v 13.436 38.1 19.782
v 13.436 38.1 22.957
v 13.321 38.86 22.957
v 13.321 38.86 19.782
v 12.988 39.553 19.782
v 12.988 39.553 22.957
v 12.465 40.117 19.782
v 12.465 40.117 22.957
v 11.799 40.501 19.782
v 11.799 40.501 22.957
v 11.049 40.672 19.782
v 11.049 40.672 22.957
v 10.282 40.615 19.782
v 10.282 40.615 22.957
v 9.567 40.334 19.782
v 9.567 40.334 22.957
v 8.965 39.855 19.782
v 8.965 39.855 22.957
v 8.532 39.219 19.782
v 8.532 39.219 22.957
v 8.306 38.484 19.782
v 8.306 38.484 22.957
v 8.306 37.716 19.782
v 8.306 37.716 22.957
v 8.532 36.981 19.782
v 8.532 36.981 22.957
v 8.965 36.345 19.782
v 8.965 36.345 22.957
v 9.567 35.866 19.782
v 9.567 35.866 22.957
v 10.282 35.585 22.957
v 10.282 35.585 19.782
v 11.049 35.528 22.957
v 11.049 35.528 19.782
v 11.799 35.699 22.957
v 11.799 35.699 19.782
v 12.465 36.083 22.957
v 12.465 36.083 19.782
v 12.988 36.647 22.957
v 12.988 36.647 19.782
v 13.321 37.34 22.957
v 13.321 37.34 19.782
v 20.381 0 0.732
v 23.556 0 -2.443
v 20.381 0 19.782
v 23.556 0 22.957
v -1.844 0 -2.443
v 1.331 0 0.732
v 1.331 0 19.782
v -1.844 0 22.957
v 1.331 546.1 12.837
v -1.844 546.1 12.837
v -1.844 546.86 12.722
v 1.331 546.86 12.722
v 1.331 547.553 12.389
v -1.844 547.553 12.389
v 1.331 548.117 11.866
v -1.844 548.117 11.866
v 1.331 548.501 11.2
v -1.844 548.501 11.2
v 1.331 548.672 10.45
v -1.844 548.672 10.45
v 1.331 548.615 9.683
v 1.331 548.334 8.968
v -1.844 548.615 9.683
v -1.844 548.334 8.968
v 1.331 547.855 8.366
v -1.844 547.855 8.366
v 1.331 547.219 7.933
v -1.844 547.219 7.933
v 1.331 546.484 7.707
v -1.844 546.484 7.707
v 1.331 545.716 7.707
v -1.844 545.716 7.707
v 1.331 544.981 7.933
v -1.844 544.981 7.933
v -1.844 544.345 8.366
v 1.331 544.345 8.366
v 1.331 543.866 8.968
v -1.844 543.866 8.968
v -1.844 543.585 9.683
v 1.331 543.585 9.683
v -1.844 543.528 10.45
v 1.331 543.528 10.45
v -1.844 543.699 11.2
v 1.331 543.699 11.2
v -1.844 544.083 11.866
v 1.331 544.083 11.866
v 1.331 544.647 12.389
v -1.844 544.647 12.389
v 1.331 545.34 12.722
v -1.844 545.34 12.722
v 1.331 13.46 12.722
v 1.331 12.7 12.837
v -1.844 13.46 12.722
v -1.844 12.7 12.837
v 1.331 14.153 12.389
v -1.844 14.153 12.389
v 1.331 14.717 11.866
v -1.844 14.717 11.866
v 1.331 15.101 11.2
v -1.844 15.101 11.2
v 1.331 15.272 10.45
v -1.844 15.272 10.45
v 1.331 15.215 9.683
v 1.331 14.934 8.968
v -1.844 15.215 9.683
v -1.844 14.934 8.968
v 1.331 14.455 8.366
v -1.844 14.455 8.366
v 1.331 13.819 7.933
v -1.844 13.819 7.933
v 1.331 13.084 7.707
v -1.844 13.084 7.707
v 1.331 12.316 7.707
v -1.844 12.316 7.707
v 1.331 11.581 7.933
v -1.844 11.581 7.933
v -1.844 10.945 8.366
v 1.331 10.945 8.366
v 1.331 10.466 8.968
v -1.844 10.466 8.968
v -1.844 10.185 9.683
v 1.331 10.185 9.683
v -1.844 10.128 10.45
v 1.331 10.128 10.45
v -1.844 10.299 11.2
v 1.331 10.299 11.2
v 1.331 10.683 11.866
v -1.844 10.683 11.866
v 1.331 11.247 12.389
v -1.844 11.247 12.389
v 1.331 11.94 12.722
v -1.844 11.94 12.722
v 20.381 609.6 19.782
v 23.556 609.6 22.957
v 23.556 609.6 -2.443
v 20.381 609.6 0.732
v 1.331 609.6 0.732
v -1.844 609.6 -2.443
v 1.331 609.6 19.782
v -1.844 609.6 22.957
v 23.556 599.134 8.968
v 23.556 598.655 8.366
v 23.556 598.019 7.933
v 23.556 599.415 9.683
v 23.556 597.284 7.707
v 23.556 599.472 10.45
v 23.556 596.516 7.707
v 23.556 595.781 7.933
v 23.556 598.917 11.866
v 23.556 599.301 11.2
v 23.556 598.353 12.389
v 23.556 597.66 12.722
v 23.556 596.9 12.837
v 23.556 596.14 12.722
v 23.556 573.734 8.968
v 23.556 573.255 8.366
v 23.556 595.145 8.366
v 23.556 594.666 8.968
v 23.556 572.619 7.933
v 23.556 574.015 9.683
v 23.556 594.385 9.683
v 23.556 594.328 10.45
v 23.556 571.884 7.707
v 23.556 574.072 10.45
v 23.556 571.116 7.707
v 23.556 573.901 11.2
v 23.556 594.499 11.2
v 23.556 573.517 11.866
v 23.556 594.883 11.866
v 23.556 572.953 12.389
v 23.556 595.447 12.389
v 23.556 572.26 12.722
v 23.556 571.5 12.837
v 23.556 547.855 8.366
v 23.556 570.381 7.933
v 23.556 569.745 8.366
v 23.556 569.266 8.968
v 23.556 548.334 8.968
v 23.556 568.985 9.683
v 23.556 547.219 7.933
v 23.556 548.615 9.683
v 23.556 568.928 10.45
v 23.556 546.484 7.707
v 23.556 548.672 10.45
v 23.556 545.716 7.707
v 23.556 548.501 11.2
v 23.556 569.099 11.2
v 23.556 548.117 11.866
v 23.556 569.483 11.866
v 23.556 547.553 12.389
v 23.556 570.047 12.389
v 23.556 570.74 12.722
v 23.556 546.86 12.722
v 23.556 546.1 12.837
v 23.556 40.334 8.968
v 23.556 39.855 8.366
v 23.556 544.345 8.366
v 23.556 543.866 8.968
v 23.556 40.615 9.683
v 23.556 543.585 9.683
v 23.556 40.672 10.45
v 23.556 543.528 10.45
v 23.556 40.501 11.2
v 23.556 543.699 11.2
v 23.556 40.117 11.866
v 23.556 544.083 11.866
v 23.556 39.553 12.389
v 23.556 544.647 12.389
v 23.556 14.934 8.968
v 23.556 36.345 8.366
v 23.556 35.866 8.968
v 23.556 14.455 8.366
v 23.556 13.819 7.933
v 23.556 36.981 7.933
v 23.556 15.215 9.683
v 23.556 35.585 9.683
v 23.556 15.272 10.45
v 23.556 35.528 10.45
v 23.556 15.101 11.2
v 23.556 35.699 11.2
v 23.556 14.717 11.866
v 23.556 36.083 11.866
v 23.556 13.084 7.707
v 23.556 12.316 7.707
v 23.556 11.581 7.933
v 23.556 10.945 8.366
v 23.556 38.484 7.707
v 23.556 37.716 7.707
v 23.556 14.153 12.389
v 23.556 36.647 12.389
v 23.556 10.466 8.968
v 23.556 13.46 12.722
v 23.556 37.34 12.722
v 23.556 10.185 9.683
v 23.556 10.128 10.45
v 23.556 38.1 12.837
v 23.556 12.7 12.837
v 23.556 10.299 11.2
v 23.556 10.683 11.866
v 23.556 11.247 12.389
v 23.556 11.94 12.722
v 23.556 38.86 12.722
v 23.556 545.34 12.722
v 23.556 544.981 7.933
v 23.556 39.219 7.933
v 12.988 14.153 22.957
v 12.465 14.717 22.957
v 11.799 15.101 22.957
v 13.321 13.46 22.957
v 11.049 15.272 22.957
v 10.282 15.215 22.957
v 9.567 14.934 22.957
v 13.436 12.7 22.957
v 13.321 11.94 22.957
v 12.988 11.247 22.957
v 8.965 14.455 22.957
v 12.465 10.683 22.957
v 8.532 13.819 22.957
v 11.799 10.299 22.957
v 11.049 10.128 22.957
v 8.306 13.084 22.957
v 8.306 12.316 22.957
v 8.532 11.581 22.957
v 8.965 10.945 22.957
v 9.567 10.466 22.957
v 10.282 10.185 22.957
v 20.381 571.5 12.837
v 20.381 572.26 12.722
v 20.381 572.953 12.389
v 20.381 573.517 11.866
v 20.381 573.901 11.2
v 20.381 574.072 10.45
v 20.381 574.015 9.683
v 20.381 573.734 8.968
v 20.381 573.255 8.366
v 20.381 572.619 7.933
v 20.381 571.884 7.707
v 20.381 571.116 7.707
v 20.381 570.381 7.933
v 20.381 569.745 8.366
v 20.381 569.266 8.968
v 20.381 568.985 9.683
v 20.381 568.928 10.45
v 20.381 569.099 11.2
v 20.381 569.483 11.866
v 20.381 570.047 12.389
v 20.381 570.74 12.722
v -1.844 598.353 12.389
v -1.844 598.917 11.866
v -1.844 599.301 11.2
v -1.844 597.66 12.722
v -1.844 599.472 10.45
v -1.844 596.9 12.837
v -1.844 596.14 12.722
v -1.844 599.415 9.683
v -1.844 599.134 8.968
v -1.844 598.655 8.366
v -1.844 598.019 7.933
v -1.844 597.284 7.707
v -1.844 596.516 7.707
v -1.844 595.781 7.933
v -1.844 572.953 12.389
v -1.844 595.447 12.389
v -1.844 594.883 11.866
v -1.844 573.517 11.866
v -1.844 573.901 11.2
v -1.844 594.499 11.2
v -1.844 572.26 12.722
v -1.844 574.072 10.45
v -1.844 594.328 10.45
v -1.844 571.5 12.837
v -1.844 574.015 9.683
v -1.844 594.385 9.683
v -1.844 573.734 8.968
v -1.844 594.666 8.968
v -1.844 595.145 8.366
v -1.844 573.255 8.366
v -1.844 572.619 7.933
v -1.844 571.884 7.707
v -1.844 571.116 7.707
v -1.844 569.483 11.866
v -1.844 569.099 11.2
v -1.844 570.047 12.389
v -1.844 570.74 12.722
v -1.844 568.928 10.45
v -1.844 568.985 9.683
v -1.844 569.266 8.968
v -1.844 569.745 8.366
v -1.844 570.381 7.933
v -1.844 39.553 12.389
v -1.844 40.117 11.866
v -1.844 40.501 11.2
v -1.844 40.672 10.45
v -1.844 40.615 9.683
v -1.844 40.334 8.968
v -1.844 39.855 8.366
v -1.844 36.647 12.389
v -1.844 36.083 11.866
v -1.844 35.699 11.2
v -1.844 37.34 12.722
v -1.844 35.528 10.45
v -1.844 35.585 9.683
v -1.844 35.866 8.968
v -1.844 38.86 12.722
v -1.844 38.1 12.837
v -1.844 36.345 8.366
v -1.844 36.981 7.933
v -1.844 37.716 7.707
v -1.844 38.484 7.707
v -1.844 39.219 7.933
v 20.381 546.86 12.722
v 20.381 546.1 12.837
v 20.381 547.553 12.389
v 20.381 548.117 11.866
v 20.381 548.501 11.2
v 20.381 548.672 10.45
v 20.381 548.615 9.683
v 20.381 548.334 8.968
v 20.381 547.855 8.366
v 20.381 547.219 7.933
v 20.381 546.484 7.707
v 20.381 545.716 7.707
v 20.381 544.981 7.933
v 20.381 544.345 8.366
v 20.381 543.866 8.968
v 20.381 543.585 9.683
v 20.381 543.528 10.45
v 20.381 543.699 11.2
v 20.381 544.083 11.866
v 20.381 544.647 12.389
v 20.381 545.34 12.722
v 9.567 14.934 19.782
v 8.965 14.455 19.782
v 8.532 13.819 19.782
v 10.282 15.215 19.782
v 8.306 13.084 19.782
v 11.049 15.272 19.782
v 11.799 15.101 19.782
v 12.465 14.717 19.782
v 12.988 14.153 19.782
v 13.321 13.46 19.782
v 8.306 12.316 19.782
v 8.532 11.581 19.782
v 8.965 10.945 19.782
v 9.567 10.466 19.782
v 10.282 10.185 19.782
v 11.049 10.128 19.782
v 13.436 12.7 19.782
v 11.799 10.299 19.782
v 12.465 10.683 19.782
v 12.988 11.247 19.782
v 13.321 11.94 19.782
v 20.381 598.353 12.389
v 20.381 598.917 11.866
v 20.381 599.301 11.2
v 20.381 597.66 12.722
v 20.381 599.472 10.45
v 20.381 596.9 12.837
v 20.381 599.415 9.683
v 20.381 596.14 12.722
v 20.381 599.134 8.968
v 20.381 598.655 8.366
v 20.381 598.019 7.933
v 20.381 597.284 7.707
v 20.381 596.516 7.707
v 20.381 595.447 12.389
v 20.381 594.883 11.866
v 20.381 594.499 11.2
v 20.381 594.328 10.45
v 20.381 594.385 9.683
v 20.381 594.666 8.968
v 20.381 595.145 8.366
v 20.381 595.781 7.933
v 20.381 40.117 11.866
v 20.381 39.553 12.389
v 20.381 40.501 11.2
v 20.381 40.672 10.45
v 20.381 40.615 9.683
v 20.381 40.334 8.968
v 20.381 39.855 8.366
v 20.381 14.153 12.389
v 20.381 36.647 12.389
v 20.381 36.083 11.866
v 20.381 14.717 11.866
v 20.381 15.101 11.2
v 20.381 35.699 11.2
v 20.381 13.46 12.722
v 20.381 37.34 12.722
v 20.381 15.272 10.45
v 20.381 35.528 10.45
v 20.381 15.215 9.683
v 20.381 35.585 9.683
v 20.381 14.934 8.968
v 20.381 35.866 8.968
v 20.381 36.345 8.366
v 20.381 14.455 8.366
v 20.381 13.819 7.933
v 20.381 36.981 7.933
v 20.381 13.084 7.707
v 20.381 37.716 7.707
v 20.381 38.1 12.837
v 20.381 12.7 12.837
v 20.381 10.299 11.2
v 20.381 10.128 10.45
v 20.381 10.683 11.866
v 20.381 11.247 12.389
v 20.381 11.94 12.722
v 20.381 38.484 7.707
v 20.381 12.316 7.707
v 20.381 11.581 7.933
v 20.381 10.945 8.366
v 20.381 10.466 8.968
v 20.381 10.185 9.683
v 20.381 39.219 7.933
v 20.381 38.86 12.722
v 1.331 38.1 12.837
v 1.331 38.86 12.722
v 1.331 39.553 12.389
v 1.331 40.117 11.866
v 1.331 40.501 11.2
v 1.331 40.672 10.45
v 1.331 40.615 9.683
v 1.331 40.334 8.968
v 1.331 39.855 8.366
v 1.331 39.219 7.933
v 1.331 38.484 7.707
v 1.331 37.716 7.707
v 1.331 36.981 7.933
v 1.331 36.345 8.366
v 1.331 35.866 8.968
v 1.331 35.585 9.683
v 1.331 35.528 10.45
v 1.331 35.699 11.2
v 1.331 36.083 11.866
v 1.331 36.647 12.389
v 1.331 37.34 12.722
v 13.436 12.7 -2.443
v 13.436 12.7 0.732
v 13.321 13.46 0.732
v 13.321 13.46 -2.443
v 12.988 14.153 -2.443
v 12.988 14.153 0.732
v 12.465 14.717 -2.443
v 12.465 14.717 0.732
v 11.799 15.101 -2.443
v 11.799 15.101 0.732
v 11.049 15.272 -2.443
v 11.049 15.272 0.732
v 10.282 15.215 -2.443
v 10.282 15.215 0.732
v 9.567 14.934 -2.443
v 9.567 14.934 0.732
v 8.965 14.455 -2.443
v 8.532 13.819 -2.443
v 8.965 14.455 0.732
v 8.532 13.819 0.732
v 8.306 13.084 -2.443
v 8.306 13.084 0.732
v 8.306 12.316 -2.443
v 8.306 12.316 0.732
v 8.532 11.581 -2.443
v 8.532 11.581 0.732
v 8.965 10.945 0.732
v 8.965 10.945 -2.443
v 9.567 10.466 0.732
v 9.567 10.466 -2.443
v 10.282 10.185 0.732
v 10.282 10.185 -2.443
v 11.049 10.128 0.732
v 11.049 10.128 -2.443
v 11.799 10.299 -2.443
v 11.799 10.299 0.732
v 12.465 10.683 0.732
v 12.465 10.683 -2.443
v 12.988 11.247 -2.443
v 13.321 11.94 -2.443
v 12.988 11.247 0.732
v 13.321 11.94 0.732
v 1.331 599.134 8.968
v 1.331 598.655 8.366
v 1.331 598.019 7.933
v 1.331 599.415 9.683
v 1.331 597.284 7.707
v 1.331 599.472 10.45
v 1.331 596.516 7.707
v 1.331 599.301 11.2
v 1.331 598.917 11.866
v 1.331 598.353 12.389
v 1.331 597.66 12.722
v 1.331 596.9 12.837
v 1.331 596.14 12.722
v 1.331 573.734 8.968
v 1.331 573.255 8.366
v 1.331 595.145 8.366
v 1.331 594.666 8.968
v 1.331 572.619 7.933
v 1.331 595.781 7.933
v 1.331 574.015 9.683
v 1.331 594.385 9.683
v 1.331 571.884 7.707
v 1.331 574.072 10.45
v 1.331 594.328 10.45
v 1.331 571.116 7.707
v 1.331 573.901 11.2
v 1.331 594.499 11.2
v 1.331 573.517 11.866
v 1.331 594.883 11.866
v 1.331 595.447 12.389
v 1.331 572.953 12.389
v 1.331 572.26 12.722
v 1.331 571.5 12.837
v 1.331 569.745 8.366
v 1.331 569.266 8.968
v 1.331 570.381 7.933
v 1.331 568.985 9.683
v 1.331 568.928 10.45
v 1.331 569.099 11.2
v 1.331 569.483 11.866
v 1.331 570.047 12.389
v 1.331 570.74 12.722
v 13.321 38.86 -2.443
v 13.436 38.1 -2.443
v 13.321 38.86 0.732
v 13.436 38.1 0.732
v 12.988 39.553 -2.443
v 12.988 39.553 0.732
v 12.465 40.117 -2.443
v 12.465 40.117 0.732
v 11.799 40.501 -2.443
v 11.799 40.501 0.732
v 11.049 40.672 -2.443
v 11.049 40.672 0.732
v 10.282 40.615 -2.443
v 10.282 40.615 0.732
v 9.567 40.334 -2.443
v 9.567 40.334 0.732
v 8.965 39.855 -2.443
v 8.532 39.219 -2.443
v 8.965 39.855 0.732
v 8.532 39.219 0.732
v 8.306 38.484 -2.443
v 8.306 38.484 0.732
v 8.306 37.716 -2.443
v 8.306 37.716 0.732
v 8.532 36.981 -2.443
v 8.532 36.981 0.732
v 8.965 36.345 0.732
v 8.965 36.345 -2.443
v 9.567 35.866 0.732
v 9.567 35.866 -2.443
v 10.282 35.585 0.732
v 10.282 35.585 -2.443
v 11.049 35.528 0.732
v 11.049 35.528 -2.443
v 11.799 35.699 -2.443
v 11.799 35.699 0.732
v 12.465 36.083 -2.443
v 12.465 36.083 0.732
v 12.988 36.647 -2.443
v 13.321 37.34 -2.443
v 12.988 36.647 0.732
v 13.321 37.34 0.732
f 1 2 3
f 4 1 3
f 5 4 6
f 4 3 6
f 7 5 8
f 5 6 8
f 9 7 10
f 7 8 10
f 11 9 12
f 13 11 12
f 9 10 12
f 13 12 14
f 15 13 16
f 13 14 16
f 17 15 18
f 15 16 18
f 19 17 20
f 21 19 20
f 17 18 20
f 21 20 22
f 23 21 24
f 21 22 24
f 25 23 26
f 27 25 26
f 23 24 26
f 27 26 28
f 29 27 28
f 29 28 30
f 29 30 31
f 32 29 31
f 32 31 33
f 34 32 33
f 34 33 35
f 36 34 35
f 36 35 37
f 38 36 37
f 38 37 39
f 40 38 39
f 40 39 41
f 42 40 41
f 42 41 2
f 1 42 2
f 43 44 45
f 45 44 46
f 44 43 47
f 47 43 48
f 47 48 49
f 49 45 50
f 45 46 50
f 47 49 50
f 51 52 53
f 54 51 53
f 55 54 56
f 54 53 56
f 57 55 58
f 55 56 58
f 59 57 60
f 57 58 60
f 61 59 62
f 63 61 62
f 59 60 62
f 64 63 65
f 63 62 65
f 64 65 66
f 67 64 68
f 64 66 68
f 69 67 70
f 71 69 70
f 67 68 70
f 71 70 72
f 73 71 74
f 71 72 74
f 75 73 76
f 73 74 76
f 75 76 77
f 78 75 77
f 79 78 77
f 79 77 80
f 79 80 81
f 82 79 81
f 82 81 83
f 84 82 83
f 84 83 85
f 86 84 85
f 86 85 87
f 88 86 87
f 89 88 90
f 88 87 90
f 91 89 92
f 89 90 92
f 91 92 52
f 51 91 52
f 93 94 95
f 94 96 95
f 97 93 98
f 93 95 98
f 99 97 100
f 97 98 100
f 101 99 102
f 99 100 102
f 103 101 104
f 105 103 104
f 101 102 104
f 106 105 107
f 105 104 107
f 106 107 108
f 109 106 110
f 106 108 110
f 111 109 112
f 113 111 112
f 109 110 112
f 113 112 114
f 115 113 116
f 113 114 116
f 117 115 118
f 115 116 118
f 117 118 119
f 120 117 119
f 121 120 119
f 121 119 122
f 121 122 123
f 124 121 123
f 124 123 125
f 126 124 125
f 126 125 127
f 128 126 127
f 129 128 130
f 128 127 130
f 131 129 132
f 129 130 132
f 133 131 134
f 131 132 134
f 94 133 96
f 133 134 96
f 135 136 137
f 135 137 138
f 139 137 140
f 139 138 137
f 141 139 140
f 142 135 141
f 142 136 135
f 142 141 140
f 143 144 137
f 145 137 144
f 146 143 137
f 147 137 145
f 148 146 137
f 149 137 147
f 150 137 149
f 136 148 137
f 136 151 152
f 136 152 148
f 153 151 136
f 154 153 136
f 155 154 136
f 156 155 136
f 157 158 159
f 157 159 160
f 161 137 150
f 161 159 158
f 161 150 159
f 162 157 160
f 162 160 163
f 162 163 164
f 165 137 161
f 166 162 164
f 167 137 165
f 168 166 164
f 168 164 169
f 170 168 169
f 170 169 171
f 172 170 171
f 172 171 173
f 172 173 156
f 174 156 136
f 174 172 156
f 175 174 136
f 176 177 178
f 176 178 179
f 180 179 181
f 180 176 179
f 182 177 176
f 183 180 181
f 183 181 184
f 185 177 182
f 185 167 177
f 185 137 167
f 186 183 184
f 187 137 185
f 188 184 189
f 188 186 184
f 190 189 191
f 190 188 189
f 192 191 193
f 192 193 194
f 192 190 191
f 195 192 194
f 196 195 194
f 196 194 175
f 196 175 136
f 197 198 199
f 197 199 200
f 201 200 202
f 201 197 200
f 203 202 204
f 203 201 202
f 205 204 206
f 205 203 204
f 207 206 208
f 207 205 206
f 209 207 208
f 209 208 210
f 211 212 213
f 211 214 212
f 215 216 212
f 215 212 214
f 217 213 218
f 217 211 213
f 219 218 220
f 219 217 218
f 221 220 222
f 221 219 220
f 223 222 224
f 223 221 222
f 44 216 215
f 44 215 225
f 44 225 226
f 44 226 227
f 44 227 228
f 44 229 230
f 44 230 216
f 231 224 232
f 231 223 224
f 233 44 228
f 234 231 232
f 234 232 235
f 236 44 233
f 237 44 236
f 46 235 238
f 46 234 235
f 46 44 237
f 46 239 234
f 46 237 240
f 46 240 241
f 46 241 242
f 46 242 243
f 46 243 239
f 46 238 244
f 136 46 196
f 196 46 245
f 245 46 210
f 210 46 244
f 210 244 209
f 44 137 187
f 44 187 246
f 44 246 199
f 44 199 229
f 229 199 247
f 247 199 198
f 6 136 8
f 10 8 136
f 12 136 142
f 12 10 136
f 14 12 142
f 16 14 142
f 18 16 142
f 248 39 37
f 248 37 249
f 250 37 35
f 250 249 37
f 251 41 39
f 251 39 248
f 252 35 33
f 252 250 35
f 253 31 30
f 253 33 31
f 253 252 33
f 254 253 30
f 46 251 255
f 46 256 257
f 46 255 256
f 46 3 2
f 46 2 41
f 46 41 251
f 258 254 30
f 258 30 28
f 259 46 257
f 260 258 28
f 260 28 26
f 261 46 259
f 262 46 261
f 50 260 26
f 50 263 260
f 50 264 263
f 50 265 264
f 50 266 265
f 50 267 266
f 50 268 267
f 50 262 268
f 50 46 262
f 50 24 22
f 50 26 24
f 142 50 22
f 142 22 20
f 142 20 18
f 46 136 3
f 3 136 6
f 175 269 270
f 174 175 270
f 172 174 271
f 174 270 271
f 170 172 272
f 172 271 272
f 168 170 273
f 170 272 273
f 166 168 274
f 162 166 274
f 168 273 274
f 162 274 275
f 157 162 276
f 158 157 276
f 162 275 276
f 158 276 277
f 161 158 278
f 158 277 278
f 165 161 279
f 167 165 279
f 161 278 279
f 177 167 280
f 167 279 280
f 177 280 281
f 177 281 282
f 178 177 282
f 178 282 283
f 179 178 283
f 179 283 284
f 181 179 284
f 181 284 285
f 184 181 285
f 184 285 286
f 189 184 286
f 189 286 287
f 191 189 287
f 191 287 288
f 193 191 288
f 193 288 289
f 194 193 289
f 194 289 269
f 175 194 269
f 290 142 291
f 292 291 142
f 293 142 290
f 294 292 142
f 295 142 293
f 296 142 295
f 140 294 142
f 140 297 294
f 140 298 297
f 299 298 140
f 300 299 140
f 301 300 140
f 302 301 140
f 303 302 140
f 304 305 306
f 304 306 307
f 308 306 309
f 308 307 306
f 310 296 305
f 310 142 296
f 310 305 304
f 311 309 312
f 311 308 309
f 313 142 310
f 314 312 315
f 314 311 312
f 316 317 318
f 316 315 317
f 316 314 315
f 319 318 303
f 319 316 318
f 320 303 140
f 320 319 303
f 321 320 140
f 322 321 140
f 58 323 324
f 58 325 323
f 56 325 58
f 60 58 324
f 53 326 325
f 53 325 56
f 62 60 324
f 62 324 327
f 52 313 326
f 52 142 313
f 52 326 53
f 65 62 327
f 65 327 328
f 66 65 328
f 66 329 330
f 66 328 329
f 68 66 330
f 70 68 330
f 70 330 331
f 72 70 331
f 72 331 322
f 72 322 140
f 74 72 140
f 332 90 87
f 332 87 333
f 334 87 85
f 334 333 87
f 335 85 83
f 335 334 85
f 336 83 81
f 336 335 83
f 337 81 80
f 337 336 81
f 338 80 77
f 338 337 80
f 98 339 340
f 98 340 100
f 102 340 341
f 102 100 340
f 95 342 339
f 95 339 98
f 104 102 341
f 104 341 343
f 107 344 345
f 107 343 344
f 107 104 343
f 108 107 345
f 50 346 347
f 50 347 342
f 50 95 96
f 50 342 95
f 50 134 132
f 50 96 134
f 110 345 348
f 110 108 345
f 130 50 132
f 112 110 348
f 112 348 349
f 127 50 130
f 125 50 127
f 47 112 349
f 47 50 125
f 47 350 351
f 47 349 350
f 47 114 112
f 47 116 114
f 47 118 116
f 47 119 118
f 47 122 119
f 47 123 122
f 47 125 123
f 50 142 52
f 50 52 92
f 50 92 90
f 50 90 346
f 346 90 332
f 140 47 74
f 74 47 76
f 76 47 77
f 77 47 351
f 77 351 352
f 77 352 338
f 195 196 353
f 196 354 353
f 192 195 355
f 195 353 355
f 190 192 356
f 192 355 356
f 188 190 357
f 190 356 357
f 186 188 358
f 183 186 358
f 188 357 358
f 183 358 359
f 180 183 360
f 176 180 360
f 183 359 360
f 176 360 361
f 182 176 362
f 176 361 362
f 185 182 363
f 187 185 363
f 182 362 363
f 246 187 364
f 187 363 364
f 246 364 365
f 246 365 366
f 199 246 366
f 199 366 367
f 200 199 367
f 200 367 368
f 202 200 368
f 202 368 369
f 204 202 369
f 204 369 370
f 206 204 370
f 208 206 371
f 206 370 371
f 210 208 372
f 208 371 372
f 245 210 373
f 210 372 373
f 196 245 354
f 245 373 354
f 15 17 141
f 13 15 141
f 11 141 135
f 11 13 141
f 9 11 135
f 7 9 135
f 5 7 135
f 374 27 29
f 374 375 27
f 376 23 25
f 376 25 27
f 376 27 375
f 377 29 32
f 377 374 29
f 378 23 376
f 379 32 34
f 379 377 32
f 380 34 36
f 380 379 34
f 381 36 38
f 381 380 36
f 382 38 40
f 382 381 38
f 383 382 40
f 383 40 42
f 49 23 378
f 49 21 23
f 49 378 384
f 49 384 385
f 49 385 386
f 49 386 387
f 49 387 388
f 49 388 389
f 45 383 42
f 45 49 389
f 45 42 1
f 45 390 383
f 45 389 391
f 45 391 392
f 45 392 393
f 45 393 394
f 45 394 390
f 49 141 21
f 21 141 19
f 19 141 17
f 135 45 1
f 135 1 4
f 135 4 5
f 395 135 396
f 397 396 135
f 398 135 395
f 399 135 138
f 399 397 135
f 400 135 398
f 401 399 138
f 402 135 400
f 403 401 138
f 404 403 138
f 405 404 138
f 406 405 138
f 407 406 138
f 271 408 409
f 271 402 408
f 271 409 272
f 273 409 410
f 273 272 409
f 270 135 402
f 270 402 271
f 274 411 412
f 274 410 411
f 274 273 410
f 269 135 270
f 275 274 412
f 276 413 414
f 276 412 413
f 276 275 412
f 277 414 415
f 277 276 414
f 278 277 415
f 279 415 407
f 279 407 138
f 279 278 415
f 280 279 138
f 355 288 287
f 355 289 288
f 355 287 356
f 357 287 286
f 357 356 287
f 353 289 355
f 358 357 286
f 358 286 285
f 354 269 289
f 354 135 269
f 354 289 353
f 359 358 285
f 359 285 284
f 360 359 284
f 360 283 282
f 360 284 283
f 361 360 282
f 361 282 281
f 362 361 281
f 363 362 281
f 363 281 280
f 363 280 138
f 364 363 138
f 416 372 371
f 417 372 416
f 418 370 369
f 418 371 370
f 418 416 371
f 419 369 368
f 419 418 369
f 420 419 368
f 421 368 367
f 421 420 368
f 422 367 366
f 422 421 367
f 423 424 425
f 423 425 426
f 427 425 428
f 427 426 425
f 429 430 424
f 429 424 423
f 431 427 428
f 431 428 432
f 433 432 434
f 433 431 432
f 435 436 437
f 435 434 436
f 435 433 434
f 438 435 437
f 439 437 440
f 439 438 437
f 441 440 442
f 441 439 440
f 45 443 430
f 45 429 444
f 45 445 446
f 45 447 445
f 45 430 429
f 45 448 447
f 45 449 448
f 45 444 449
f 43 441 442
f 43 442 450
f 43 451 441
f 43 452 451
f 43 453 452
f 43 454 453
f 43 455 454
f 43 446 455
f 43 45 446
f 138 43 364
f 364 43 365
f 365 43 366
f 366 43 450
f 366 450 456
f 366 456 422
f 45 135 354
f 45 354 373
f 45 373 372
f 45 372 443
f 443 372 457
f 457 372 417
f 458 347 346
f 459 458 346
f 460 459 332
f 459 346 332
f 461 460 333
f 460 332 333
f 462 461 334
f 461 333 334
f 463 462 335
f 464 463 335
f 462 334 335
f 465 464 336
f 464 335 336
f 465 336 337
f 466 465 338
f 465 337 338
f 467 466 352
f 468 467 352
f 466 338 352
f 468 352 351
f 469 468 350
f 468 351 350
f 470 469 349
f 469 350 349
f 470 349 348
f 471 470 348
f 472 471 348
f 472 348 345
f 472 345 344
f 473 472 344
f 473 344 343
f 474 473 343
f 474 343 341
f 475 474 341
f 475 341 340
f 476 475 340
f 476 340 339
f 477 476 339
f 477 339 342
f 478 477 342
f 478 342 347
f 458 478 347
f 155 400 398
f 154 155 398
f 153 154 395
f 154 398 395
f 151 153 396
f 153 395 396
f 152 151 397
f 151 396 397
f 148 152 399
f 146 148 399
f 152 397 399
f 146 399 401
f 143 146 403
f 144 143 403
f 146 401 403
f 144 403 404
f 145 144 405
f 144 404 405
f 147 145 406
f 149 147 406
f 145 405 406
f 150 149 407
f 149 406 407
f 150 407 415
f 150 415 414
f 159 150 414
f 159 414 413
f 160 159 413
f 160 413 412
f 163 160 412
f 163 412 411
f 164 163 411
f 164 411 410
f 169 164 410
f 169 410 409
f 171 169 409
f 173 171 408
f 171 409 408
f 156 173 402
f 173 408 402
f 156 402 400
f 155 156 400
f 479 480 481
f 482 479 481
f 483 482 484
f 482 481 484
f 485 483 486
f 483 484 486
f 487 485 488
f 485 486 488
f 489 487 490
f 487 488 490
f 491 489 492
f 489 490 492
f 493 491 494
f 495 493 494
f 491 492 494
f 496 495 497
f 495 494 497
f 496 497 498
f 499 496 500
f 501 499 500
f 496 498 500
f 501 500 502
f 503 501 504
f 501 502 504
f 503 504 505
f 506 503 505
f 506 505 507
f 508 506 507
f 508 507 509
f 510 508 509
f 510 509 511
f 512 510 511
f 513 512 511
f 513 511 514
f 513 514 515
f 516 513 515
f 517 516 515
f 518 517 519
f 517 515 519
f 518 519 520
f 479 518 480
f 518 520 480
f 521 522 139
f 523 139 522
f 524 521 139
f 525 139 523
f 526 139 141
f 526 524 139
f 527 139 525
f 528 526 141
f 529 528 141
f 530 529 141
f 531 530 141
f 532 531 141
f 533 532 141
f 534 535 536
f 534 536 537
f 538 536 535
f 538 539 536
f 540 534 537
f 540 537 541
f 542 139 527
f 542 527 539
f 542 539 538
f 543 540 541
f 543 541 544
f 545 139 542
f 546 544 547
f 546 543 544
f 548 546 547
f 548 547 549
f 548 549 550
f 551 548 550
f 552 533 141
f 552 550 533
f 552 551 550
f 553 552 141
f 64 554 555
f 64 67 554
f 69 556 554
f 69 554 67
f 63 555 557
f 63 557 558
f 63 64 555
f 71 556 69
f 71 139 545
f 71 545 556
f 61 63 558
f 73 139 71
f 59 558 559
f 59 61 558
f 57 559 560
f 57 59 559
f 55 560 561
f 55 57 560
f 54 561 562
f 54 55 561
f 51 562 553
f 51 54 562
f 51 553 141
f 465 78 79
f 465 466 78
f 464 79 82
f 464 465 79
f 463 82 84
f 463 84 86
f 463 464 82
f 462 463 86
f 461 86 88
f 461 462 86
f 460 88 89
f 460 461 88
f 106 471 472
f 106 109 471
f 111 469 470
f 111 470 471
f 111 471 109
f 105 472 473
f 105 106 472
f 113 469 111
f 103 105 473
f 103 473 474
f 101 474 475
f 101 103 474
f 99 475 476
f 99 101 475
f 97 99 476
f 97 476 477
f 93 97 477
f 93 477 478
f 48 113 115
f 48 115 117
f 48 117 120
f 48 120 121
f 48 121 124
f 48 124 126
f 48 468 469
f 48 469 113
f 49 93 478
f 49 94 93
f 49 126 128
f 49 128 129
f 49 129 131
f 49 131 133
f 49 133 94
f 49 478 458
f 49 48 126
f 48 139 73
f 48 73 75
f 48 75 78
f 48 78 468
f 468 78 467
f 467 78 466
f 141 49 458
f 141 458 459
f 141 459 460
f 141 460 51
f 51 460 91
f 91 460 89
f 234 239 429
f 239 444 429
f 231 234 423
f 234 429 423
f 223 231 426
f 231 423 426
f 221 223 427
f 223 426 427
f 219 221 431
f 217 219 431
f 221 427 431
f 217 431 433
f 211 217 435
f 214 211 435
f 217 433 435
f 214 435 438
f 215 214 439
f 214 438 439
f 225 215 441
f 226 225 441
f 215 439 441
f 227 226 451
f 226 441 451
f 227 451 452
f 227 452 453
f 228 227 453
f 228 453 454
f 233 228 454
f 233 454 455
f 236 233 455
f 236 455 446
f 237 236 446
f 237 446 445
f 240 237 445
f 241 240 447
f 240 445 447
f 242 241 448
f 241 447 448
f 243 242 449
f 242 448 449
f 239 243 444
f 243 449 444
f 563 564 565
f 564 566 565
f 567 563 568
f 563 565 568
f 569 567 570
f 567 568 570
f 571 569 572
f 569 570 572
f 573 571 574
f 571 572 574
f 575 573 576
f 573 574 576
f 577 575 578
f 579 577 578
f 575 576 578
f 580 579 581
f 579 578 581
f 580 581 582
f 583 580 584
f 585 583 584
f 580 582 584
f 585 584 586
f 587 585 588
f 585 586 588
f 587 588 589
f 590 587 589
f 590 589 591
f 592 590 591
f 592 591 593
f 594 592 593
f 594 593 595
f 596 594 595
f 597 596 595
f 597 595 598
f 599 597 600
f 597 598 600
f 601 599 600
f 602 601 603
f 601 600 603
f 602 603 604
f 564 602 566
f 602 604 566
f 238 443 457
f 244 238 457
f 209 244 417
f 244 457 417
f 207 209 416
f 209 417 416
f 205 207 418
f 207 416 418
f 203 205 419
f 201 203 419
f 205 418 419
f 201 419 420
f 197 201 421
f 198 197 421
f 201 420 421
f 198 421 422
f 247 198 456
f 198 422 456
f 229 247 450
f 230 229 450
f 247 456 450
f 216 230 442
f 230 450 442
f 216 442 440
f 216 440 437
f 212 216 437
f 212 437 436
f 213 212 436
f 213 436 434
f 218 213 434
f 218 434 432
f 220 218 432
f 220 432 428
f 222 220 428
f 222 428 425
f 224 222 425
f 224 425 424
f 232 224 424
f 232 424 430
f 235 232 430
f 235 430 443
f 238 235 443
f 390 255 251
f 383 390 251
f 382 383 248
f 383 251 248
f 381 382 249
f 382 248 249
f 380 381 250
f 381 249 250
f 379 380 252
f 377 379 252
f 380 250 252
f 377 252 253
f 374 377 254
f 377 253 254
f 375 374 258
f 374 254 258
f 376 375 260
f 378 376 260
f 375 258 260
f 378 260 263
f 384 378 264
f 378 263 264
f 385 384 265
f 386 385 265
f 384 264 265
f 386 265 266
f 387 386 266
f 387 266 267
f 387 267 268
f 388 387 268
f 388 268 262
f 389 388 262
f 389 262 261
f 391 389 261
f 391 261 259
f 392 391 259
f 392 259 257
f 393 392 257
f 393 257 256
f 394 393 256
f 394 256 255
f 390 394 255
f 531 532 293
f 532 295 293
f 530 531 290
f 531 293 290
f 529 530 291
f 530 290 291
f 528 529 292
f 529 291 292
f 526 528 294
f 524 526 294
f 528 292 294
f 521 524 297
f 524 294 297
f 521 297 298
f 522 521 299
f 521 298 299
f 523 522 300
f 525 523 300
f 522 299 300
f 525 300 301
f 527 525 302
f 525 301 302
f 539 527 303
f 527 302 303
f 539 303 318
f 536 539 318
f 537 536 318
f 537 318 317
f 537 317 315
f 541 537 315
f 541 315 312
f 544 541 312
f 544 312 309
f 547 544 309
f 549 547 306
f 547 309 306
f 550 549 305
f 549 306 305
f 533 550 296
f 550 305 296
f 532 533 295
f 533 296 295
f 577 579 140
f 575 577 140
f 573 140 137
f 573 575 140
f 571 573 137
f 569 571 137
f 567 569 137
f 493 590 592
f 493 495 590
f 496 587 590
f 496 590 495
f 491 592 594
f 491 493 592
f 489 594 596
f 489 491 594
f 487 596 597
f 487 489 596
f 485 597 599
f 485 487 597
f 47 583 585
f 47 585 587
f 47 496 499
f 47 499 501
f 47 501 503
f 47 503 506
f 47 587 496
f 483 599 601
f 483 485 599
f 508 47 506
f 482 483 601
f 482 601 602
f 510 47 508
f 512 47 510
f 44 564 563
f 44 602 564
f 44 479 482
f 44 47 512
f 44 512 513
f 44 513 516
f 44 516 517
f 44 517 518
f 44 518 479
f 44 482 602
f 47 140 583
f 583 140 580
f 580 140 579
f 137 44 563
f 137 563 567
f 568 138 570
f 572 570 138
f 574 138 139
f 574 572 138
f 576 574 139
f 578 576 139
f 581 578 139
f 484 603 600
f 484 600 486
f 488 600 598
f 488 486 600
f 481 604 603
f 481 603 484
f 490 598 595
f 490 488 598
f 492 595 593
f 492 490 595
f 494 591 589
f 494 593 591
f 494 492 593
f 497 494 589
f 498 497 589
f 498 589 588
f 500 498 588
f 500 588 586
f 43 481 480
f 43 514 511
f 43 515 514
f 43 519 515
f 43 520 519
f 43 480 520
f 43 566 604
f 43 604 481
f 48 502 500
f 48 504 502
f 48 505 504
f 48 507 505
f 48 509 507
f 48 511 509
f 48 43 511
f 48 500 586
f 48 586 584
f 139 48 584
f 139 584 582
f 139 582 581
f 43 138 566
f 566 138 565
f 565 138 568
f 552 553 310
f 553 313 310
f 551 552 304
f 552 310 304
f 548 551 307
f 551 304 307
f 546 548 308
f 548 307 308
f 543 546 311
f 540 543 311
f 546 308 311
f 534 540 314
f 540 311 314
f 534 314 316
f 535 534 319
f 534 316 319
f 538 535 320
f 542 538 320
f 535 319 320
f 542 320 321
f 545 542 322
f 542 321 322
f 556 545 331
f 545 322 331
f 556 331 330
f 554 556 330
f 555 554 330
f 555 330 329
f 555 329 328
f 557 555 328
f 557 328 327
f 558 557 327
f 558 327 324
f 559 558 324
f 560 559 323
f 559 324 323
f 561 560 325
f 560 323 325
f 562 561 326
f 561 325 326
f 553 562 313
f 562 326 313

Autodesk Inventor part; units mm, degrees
ref_plane "YZ Plane" through (0, 0, 0) normal (1, 0, 0) x (0, 1, 0)
ref_plane "XZ Plane" through (0, 0, 0) normal (0, 1, 0) x (-1, 0, 0)
ref_plane "XY Plane" through (0, 0, 0) normal (0, 0, 1) x (1, 0, 0)
sketch "Sketch1" plane through (0, 0, 0) normal (0, 1, 0) x (-1, 0, 0)
  line L0 (1.8436, -2.4426) -> (-23.5564, -2.4426)
  line L1 (-23.5564, -2.4426) -> (-23.5564, 22.9574)
  line L2 (-23.5564, 22.9574) -> (1.8436, 22.9574)
  line L3 (1.8436, 22.9574) -> (1.8436, -2.4426)
  line L4 (-20.3814, 0.7324) -> (-1.3314, 0.7324)
  line L5 (-1.3314, 0.7324) -> (-1.3314, 19.7824)
  line L6 (-1.3314, 19.7824) -> (-20.3814, 19.7824)
  line L7 (-20.3814, 19.7824) -> (-20.3814, 0.7324)
  point P0 (0, 0)
  dimension "d0" = 25.4
  dimension "d1" = 25.4
  dimension "d2" = 3.175
extrude "Extrusion1" add sketch "Sketch1" along normal blind 609.6
sketch "Sketch2" plane through (-1.8436, 0, -2.4426) normal (-1, 0, 0) x (0, 0, 1)
  line L0 (22.225, 0) -> (3.175, 0) construction
  line L1 (12.7, 0) -> (12.7, 12.7) construction
  line L2 (12.7, 12.7) -> (12.7, 38.1) construction
  line L3 (3.175, 609.6) -> (22.225, 609.6) construction
  line L4 (12.7, 609.6) -> (12.7, 596.9) construction
  line L5 (12.7, 596.9) -> (12.7, 571.5) construction
  circle A0 centre (12.7, 596.9) radius 2.5797
  circle A1 centre (12.7, 571.5) radius 2.5797
  circle A2 centre (12.7, 12.7) radius 2.5797
  circle A3 centre (12.7, 38.1) radius 2.5797
  point P0 (2.4426, 0)
  dimension "d5" = 12.7
  dimension "d6" = 25.4
  dimension "d7" = 12.7
  dimension "d8" = 25.4
  dimension "d9" = 5.1594
  dimension "d10" = 5.1594
  dimension "d11" = 5.1594
  dimension "d12" = 5.1594
extrude "Extrusion2" cut sketch "Sketch2" against normal blind 635
sketch "Sketch3" plane through (-1.8436, 0, -2.4426) normal (-1, 0, 0) x (0, 0, 1)
  circle A0 centre (12.7, 571.5) radius 2.5797 construction
  line L0 (12.7, 571.5) -> (12.7, 546.1) construction
  circle A1 centre (12.7, 546.1) radius 2.5797
  point P0 (2.4426, 0)
  dimension "d15" = 25.4
  dimension "d16" = 5.1594
extrude "Extrusion3" cut sketch "Sketch3" against normal blind 127
sketch "Sketch4" plane through (-1.8436, 0, 22.9574) normal (0, 0, 1) x (1, 0, 0)
  line L0 (0, 0) -> (25.4, 0) construction
  line L1 (12.7, 0) -> (12.7, 12.7) construction
  line L2 (12.7, 12.7) -> (12.7, 38.1) construction
  circle A0 centre (12.7, 12.7) radius 2.5797
  circle A1 centre (12.7, 38.1) radius 2.5797
  point P0 (1.8436, 0)
  dimension "d19" = 12.7
  dimension "d20" = 25.4
  dimension "d21" = 5.1594
  dimension "d22" = 5.1594
extrude "Extrusion4" cut sketch "Sketch4" against normal blind 127
properties part number "25in 1x1 Beam"
